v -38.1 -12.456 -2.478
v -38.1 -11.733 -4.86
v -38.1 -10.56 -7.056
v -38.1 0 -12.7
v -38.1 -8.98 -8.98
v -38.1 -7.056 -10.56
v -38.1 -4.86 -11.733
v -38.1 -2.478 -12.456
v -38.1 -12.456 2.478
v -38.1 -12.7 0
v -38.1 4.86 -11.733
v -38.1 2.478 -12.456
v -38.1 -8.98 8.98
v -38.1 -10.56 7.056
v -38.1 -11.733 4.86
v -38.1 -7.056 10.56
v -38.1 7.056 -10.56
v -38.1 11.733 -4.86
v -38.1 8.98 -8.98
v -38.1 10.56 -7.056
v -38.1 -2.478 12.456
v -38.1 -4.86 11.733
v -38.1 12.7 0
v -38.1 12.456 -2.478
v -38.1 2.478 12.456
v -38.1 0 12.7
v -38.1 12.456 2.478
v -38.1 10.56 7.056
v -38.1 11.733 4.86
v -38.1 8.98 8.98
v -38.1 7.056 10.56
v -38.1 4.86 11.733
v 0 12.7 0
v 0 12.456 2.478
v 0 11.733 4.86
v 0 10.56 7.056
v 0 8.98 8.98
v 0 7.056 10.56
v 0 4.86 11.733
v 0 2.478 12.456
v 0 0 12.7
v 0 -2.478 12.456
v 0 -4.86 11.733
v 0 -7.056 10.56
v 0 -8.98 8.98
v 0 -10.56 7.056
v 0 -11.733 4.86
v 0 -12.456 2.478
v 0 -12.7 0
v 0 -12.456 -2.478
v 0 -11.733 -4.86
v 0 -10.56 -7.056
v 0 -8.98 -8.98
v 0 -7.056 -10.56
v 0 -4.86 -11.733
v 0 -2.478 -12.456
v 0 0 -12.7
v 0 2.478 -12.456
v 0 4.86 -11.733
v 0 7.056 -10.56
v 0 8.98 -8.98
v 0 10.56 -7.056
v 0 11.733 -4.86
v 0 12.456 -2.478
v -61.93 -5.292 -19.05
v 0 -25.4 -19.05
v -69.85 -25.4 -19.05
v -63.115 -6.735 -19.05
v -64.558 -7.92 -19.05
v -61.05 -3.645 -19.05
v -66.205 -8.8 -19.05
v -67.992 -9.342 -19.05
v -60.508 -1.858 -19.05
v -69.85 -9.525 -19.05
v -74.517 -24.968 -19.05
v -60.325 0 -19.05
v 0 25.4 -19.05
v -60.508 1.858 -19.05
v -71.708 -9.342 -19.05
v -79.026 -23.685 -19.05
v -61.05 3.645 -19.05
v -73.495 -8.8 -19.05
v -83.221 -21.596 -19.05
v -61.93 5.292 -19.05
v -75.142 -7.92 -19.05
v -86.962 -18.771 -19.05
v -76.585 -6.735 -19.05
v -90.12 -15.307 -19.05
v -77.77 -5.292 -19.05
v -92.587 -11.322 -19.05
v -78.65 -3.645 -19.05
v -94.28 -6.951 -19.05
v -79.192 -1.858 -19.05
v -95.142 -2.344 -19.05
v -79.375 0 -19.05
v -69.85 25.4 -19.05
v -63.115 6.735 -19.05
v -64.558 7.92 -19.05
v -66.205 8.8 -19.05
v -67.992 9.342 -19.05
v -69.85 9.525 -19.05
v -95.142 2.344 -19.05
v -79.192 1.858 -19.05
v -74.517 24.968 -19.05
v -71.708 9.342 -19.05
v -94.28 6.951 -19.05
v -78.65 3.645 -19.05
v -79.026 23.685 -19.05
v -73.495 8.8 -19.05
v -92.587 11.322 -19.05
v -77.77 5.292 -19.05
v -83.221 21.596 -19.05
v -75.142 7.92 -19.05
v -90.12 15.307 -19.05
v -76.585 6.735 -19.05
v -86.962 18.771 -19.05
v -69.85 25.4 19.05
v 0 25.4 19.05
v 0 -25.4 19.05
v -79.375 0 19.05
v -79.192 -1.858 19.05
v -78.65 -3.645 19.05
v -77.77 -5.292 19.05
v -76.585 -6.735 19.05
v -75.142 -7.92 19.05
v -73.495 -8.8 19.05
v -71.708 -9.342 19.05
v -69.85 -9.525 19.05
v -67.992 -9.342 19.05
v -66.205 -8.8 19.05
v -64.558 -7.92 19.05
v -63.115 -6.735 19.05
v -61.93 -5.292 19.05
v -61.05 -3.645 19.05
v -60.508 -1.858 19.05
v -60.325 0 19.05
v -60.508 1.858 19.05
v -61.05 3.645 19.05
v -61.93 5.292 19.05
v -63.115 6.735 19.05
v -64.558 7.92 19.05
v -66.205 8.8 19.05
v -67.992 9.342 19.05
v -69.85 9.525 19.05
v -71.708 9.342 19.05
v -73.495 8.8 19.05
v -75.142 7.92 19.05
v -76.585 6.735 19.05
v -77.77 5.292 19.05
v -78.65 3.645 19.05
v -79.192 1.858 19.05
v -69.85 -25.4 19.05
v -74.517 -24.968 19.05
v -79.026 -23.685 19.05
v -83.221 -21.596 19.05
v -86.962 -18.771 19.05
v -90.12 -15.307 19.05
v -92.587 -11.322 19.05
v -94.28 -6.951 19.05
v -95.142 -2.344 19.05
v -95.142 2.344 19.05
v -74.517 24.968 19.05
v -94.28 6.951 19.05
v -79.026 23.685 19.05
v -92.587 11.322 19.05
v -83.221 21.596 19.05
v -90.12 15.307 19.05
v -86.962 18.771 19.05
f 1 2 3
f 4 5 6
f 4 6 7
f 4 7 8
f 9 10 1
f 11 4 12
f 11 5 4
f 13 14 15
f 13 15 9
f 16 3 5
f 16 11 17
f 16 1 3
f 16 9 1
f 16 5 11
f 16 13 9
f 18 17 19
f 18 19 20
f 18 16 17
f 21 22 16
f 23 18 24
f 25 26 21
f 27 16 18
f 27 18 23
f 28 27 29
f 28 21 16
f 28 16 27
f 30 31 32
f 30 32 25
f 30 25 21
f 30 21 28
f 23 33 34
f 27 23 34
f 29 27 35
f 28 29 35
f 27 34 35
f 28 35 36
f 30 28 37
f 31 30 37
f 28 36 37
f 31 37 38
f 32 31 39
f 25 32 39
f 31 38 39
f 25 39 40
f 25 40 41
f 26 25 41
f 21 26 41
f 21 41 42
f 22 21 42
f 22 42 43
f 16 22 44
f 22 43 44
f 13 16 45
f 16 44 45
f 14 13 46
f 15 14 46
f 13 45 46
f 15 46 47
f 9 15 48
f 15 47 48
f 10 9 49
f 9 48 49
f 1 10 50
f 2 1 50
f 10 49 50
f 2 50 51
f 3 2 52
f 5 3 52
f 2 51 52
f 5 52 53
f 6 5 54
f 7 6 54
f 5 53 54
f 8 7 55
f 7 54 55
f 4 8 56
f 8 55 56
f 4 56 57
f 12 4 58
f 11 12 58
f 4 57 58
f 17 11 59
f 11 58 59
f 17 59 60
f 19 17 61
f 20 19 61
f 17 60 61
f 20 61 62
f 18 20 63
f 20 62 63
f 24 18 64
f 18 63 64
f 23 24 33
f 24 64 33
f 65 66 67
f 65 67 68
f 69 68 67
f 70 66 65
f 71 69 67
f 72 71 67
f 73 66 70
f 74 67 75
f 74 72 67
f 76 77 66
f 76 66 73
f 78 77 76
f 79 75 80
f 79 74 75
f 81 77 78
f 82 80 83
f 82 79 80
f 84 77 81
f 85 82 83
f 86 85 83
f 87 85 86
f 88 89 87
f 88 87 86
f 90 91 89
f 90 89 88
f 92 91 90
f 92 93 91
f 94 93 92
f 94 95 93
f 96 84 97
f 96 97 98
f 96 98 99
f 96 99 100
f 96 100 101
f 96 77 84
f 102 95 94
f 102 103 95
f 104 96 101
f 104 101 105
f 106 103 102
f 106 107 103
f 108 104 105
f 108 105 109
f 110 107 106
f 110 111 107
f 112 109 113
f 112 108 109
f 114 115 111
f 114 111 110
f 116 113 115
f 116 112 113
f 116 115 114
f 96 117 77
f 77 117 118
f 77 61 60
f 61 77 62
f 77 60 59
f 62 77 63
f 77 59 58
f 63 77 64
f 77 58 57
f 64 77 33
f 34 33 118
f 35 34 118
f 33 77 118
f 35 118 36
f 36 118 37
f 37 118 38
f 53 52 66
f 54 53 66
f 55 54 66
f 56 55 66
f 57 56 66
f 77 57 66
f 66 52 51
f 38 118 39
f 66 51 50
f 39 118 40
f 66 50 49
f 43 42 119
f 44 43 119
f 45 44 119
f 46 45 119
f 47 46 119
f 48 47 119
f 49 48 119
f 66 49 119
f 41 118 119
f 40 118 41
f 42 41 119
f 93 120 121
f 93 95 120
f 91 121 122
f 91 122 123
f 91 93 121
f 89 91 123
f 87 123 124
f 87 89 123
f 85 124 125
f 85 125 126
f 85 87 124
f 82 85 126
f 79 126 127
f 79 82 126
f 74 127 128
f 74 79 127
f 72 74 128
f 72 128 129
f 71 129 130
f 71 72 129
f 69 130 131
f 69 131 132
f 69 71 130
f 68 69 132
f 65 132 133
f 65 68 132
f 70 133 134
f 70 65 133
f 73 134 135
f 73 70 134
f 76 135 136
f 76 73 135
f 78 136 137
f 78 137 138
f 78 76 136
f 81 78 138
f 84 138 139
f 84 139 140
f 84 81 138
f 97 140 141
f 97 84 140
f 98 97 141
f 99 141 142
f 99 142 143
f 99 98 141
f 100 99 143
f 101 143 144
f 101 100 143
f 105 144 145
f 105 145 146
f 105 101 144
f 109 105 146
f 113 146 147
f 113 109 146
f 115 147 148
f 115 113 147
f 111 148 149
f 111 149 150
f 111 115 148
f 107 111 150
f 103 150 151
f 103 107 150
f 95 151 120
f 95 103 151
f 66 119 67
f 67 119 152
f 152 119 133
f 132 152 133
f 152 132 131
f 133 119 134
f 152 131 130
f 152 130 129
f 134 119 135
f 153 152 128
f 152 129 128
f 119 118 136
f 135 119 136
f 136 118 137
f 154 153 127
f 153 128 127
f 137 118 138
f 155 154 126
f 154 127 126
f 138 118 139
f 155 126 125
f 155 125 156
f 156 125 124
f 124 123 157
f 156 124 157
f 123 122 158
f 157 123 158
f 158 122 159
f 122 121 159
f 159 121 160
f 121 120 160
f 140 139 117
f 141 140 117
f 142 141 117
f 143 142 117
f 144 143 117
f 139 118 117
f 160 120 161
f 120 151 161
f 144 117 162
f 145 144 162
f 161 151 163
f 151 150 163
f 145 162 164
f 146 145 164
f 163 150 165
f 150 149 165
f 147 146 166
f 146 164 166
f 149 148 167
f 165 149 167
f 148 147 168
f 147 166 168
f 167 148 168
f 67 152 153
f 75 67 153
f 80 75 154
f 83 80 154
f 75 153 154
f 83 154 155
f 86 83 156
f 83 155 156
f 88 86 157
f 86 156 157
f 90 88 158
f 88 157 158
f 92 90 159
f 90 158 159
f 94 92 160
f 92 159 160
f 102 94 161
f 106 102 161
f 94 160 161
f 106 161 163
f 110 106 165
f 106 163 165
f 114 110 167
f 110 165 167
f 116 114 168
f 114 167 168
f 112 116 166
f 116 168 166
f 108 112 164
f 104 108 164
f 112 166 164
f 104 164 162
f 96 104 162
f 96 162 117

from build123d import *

# Parameters (mm, degrees)
SKETCH3_R          = 9.525
BASE_EXTRUDE_DEPTH = 19.05
SKETCH4_R          = 12.7
CUT_EXTRUDE1_DEPTH = 38.1


with BuildPart() as part:
    # Sketch3 → Base-Extrude (new, symmetric)
    with BuildSketch(Plane.XY):
        with BuildLine():
            Line((-69.85, 25.4), (0, 25.4))
            Line((0, 25.4), (0, -25.4))
            Line((0, -25.4), (-69.85, -25.4))
            ThreePointArc((-69.85, -25.4), (-95.25, 0), (-69.85, 25.4))
        make_face()
        with Locations(Location((-69.85, 0, 0), (0, 0, 180))):
            Circle(SKETCH3_R, mode=Mode.SUBTRACT)
    extrude(amount=BASE_EXTRUDE_DEPTH, both=True)

    # Sketch4 → Cut-Extrude1 (cut)
    with BuildSketch(Plane(origin=(0, 0, 0), x_dir=(0, 0, -1), z_dir=(1, 0, 0))):
        with Locations(Location((0, 0, 0), (0, 0, 90))):
            Circle(SKETCH4_R)
    extrude(amount=-CUT_EXTRUDE1_DEPTH, mode=Mode.SUBTRACT)


solid = part.part
